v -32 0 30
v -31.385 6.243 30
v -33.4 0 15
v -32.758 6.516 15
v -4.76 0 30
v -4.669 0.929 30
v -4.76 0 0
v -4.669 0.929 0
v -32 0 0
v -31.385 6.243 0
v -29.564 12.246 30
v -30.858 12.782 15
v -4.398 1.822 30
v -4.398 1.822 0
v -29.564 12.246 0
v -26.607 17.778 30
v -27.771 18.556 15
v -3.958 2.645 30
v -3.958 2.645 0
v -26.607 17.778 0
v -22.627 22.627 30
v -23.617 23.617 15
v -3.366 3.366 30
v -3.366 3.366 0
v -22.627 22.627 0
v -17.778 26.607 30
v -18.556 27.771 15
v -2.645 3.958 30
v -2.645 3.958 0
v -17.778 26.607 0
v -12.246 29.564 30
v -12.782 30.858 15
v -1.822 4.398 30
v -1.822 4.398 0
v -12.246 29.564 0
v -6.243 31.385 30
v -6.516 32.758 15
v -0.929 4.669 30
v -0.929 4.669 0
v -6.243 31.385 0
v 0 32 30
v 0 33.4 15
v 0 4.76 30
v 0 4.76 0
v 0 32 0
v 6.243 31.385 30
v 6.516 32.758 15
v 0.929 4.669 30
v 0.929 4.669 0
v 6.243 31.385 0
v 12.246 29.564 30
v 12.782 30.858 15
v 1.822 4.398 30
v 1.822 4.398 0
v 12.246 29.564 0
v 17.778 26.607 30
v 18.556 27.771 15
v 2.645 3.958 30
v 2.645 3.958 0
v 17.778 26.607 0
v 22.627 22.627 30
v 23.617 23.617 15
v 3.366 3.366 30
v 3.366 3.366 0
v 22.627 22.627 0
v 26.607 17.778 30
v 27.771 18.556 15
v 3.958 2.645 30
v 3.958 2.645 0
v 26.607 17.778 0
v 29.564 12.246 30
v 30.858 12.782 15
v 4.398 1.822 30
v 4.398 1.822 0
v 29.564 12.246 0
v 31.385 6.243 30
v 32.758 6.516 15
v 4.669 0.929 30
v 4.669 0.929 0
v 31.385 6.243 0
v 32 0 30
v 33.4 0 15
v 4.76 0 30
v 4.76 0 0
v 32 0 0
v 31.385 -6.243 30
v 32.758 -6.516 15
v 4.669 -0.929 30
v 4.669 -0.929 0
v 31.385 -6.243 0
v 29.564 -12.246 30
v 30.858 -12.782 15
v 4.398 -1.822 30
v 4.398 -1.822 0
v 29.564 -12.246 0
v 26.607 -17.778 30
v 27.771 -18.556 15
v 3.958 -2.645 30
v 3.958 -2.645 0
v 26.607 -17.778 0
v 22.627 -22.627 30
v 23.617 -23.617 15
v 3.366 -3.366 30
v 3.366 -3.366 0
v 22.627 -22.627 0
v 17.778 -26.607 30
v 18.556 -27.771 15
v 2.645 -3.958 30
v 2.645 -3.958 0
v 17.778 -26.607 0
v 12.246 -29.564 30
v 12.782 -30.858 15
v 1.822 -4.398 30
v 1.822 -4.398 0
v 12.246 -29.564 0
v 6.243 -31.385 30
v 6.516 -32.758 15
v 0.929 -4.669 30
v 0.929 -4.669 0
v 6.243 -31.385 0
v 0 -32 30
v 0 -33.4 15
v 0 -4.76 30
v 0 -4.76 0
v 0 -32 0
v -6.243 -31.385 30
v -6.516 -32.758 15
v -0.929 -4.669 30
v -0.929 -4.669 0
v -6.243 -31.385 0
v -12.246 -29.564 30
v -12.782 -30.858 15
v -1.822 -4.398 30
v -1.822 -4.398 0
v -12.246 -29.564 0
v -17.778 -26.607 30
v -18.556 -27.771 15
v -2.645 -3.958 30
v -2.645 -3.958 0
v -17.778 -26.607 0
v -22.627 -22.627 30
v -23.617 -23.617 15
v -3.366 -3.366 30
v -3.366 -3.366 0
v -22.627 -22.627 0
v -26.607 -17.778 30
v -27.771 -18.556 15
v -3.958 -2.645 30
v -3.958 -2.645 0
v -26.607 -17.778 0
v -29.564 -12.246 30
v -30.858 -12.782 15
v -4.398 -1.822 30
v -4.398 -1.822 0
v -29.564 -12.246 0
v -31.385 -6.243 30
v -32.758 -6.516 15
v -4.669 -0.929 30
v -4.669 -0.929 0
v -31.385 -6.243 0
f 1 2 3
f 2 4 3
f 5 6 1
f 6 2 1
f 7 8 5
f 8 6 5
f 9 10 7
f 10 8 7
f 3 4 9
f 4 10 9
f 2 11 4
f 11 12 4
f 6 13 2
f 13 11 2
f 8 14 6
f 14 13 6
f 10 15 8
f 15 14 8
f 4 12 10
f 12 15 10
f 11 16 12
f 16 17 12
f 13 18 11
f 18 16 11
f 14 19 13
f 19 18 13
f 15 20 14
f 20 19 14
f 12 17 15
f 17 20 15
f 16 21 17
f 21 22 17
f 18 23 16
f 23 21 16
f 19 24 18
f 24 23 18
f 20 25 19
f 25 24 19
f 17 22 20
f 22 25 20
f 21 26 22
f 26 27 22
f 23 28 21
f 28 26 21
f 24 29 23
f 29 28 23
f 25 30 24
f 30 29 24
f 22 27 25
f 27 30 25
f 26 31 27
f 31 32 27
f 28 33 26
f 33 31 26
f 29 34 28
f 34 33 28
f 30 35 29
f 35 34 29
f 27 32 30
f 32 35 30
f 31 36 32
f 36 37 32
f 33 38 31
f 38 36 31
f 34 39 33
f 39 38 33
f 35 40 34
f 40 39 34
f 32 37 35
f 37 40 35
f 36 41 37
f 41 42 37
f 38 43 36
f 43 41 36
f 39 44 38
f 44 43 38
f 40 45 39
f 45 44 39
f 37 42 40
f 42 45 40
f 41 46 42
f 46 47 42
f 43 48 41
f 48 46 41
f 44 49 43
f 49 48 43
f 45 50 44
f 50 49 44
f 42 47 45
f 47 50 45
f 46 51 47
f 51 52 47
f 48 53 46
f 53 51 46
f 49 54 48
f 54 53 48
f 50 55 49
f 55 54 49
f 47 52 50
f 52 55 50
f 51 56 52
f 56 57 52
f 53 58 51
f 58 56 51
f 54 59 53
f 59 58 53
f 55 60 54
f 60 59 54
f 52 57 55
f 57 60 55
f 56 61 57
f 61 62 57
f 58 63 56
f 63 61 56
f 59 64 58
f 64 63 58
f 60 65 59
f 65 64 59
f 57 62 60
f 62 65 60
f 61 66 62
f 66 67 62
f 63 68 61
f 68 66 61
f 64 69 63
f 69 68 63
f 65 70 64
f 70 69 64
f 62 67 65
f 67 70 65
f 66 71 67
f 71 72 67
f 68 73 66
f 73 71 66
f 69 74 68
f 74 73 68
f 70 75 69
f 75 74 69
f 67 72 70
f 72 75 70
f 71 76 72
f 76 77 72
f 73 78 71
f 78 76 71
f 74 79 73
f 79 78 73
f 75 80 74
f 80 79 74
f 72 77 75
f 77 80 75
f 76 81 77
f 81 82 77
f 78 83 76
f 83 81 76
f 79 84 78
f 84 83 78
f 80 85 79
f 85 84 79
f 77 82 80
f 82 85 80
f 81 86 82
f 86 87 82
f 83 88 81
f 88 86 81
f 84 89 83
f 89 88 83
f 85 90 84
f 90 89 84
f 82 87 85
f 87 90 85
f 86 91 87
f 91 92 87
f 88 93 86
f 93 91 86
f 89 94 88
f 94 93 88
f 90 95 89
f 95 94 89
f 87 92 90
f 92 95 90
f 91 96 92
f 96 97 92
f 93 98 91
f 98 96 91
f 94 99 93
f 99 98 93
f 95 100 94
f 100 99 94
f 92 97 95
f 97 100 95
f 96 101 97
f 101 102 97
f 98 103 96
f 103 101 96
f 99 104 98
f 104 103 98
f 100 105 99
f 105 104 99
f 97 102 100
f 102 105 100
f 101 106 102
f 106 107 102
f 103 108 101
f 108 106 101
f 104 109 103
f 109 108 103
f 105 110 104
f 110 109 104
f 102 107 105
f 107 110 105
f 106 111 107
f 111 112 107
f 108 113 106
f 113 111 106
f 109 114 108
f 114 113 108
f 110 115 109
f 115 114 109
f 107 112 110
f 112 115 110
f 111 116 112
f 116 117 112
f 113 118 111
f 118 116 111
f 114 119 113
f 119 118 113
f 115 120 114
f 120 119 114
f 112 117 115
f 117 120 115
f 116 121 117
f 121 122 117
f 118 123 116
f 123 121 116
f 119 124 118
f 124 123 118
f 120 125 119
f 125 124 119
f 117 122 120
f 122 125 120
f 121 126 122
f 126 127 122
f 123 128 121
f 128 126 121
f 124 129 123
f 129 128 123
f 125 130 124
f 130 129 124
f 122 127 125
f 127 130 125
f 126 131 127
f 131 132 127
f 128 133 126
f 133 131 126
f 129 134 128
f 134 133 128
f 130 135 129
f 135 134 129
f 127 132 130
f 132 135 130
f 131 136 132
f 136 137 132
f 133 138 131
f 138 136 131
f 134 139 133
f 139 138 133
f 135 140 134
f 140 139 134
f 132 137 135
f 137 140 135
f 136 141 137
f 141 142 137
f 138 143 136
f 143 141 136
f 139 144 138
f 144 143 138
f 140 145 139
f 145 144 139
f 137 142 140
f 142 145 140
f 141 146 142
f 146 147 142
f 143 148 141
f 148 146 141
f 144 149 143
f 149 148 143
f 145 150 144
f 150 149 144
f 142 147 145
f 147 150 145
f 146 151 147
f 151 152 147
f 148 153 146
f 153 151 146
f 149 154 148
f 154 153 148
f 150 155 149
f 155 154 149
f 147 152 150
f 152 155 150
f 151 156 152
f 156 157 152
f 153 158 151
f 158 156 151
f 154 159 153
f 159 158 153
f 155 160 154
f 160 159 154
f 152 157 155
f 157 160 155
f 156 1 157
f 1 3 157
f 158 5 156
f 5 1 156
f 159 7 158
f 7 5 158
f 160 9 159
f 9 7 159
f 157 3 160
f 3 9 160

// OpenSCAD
$fn = 32;

// ----------------------------------------------------------------------
// Belt roller: 64 mm barrel, 30 mm wide, bore 9.52 mm
// ----------------------------------------------------------------------

// --- parameters (mm) ---
bore_d = 9.52;            // bore
barrel_d = 64;            // barrel diameter
roller_w = 30;            // roller width
crown = 1.4;              // crown height at mid width

roller_profile = [[4.76, 0], [32, 0], [33.4, 15], [32, 30], [4.76, 30]];

/* the profile stays clear of the axis, so the bore comes out of the revolve */
rotate_extrude() polygon(roller_profile);
